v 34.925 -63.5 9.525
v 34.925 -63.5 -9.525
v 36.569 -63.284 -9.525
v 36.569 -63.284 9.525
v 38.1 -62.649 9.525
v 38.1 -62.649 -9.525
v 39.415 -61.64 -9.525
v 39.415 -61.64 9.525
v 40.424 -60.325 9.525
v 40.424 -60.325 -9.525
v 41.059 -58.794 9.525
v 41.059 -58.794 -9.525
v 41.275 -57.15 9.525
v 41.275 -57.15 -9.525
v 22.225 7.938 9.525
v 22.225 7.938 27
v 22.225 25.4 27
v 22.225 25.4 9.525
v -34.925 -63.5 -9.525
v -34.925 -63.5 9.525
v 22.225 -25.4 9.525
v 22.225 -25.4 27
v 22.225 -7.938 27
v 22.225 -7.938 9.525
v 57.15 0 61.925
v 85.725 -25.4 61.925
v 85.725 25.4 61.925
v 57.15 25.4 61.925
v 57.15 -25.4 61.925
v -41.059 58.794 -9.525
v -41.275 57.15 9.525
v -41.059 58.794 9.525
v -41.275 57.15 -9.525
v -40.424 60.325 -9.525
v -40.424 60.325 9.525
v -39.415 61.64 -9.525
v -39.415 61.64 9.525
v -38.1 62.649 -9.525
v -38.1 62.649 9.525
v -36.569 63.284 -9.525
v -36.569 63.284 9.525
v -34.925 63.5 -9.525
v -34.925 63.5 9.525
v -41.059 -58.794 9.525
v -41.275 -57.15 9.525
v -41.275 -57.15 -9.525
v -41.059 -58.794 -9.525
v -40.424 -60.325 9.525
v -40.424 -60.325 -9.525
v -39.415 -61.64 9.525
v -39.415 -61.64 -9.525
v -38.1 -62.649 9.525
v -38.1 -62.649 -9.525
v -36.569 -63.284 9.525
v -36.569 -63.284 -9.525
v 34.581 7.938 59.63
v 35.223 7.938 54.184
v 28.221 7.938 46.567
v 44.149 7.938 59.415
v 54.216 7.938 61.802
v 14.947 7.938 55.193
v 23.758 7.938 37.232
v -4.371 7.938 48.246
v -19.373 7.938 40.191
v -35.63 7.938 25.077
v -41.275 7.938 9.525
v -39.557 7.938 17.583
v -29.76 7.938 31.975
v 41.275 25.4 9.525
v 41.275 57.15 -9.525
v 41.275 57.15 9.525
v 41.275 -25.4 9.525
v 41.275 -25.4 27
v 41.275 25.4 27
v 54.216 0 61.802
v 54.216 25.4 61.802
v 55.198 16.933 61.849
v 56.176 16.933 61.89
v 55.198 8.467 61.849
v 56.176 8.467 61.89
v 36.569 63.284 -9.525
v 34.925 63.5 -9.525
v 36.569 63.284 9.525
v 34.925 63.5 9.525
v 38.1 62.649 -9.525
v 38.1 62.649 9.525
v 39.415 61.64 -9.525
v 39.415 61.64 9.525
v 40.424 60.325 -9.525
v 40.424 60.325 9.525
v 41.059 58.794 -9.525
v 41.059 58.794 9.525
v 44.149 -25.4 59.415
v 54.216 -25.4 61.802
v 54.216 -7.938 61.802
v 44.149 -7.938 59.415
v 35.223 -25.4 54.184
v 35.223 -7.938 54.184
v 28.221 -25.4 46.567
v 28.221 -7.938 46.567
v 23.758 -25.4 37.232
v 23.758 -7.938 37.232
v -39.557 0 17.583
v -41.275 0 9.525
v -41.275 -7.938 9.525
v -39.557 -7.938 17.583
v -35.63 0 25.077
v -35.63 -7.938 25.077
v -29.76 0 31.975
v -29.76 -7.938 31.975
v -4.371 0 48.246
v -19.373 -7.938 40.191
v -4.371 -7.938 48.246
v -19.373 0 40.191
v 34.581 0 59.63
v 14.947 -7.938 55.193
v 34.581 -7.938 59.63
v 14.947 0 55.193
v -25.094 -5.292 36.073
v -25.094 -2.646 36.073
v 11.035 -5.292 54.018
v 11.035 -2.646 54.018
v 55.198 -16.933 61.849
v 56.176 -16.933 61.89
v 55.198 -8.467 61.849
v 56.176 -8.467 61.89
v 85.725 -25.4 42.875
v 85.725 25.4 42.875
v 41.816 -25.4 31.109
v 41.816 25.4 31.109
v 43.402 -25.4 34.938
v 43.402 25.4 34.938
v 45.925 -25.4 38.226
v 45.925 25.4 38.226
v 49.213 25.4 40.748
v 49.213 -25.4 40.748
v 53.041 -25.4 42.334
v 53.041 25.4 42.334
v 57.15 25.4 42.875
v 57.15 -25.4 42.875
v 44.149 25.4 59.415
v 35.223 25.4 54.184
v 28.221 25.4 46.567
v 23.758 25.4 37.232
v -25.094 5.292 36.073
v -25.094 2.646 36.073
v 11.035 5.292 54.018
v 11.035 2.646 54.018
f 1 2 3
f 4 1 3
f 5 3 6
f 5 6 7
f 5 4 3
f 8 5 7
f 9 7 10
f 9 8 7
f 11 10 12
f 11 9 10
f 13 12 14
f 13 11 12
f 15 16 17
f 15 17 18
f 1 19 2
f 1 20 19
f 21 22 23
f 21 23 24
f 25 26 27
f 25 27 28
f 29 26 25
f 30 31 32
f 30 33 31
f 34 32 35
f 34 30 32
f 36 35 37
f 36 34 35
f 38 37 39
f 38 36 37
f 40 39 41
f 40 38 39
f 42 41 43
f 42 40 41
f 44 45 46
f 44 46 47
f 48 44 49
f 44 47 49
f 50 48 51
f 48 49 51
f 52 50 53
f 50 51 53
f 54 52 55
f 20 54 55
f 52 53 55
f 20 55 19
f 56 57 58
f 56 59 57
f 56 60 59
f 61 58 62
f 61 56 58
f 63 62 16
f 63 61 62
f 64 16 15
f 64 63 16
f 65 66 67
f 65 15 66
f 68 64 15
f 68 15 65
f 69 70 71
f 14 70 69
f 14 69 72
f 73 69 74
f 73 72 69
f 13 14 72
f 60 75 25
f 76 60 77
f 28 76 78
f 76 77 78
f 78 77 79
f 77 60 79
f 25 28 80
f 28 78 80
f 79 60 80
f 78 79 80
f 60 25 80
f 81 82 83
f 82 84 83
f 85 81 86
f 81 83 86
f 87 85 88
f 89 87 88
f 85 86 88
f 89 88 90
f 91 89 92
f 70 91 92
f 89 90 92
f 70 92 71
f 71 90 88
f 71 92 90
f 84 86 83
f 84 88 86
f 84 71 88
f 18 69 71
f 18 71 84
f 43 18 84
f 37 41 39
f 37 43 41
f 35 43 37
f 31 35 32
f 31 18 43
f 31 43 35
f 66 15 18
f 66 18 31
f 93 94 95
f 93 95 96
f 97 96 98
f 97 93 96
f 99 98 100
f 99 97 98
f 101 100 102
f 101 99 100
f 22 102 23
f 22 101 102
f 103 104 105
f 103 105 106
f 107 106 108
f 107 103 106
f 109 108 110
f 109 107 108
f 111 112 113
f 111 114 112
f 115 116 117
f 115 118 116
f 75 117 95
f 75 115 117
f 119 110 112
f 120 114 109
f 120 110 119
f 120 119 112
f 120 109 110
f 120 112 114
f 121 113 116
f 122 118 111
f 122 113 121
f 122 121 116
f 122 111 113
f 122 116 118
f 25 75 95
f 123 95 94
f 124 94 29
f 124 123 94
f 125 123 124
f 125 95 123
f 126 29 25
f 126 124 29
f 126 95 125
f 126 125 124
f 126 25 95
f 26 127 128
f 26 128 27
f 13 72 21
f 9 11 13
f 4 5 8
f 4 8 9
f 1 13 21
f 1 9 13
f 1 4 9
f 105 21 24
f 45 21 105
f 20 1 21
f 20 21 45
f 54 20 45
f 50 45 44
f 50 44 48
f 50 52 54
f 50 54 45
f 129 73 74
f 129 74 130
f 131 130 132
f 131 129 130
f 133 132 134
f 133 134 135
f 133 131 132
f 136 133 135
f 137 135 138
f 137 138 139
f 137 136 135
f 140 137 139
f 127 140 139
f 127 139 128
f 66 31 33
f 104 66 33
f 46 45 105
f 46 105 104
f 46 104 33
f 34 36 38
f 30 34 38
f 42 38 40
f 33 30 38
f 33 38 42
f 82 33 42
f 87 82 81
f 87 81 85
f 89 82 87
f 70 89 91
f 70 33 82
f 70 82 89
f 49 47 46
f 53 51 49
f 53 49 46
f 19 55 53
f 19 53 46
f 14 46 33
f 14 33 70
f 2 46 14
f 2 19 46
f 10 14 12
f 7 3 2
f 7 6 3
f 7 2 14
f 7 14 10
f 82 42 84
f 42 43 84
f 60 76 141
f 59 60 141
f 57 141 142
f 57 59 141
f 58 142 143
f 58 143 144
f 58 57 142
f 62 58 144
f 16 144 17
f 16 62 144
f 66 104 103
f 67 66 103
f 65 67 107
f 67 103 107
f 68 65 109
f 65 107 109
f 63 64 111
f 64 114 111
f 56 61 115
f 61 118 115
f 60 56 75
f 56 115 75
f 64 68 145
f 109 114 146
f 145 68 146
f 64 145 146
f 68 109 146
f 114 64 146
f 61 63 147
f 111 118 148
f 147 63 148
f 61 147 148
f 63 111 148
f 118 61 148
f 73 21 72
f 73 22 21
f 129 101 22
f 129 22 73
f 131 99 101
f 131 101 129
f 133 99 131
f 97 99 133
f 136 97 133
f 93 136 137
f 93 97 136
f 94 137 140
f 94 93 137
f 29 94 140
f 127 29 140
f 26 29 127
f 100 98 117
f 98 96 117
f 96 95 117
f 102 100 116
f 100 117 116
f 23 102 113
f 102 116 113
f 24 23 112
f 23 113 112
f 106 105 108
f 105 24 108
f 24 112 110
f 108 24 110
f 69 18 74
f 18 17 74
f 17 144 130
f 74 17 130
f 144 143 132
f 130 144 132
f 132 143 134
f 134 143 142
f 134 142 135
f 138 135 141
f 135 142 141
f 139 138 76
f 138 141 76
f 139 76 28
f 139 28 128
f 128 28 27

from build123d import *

# Parameters (mm, degrees)
F1_DEPTH = 63.5
F0_W     = 25.4
F0_H     = 19.05
F2_DEPTH = 25.4
F3_DEPTH = 7.9375
F4_R     = 6.35


with BuildPart() as f1:
    # F0 (on Front) → F1 (new body, symmetric)
    with BuildSketch(Plane.XZ):
        Polygon((-41.275, -9.525), (41.275, -9.525), (41.275, 9.525), (22.225, 9.525), (-41.275, 9.525), align=None)
    extrude(amount=F1_DEPTH, both=True)

    # F0 (on Front) → F2 (join, symmetric)
    with BuildSketch(Plane.XZ):
        with BuildLine():
            Line((22.225, 9.525), (41.275, 9.525))
            Line((41.275, 9.525), (41.275, 27.0002))
            ThreePointArc((41.275, 27.0002), (45.9246798487, 38.2255201513), (57.15, 42.8752))
            Line((57.15, 42.8752), (60.325, 42.8752))
            Line((60.325, 42.8752), (60.325, 61.9252))
            Line((60.325, 61.9252), (57.15, 61.9252))
            add(Edge.make_bspline(
                [(54.2163315583, 61.8017691381), (55.1991693528, 61.8523831692), (56.1772996051, 61.8935558804), (57.15, 61.9252)],
                knots=[108.9789344494, 108.9789344494, 108.9789344494, 108.9789344494, 111.5045361635, 111.5045361635, 111.5045361635, 111.5045361635], degree=3))
            ThreePointArc((54.2163315583, 61.8017691381), (31.4379989564, 50.6359489269), (22.225, 27.0002))
            Line((22.225, 27.0002), (22.225, 9.525))
        make_face()
        with Locations((73.025, 52.4002)):
            Rectangle(F0_W, F0_H)
    extrude(amount=F2_DEPTH, both=True)

    # F0 (on Front) → F3 (join, symmetric)
    with BuildSketch(Plane.XZ):
        with BuildLine():
            add(Edge.make_bspline(
                [(-41.275, 9.525), (-39.3669167173, 39.8550550116), (11.8071840745, 59.6177893167), (54.2163315583, 61.8017691381)],
                knots=[0, 0, 0, 0, 108.9789344494, 108.9789344494, 108.9789344494, 108.9789344494], degree=3))
            Line((-41.275, 9.525), (22.225, 9.525))
            Line((22.225, 9.525), (22.225, 27.0002))
            ThreePointArc((22.225, 27.0002), (31.4379989564, 50.6359489269), (54.2163315583, 61.8017691381))
        make_face()
    extrude(amount=F3_DEPTH, both=True)

    # F4
    f4_edges = [f1.edges().sort_by_distance(p)[0] for p in [
        (41.275, -63.5, 0),
        (-41.275, -63.5, 0),
        (41.275, 63.5, 0),
        (-41.275, 63.5, 0),
    ]]
    fillet(f4_edges, radius=F4_R)


solid = f1.part
